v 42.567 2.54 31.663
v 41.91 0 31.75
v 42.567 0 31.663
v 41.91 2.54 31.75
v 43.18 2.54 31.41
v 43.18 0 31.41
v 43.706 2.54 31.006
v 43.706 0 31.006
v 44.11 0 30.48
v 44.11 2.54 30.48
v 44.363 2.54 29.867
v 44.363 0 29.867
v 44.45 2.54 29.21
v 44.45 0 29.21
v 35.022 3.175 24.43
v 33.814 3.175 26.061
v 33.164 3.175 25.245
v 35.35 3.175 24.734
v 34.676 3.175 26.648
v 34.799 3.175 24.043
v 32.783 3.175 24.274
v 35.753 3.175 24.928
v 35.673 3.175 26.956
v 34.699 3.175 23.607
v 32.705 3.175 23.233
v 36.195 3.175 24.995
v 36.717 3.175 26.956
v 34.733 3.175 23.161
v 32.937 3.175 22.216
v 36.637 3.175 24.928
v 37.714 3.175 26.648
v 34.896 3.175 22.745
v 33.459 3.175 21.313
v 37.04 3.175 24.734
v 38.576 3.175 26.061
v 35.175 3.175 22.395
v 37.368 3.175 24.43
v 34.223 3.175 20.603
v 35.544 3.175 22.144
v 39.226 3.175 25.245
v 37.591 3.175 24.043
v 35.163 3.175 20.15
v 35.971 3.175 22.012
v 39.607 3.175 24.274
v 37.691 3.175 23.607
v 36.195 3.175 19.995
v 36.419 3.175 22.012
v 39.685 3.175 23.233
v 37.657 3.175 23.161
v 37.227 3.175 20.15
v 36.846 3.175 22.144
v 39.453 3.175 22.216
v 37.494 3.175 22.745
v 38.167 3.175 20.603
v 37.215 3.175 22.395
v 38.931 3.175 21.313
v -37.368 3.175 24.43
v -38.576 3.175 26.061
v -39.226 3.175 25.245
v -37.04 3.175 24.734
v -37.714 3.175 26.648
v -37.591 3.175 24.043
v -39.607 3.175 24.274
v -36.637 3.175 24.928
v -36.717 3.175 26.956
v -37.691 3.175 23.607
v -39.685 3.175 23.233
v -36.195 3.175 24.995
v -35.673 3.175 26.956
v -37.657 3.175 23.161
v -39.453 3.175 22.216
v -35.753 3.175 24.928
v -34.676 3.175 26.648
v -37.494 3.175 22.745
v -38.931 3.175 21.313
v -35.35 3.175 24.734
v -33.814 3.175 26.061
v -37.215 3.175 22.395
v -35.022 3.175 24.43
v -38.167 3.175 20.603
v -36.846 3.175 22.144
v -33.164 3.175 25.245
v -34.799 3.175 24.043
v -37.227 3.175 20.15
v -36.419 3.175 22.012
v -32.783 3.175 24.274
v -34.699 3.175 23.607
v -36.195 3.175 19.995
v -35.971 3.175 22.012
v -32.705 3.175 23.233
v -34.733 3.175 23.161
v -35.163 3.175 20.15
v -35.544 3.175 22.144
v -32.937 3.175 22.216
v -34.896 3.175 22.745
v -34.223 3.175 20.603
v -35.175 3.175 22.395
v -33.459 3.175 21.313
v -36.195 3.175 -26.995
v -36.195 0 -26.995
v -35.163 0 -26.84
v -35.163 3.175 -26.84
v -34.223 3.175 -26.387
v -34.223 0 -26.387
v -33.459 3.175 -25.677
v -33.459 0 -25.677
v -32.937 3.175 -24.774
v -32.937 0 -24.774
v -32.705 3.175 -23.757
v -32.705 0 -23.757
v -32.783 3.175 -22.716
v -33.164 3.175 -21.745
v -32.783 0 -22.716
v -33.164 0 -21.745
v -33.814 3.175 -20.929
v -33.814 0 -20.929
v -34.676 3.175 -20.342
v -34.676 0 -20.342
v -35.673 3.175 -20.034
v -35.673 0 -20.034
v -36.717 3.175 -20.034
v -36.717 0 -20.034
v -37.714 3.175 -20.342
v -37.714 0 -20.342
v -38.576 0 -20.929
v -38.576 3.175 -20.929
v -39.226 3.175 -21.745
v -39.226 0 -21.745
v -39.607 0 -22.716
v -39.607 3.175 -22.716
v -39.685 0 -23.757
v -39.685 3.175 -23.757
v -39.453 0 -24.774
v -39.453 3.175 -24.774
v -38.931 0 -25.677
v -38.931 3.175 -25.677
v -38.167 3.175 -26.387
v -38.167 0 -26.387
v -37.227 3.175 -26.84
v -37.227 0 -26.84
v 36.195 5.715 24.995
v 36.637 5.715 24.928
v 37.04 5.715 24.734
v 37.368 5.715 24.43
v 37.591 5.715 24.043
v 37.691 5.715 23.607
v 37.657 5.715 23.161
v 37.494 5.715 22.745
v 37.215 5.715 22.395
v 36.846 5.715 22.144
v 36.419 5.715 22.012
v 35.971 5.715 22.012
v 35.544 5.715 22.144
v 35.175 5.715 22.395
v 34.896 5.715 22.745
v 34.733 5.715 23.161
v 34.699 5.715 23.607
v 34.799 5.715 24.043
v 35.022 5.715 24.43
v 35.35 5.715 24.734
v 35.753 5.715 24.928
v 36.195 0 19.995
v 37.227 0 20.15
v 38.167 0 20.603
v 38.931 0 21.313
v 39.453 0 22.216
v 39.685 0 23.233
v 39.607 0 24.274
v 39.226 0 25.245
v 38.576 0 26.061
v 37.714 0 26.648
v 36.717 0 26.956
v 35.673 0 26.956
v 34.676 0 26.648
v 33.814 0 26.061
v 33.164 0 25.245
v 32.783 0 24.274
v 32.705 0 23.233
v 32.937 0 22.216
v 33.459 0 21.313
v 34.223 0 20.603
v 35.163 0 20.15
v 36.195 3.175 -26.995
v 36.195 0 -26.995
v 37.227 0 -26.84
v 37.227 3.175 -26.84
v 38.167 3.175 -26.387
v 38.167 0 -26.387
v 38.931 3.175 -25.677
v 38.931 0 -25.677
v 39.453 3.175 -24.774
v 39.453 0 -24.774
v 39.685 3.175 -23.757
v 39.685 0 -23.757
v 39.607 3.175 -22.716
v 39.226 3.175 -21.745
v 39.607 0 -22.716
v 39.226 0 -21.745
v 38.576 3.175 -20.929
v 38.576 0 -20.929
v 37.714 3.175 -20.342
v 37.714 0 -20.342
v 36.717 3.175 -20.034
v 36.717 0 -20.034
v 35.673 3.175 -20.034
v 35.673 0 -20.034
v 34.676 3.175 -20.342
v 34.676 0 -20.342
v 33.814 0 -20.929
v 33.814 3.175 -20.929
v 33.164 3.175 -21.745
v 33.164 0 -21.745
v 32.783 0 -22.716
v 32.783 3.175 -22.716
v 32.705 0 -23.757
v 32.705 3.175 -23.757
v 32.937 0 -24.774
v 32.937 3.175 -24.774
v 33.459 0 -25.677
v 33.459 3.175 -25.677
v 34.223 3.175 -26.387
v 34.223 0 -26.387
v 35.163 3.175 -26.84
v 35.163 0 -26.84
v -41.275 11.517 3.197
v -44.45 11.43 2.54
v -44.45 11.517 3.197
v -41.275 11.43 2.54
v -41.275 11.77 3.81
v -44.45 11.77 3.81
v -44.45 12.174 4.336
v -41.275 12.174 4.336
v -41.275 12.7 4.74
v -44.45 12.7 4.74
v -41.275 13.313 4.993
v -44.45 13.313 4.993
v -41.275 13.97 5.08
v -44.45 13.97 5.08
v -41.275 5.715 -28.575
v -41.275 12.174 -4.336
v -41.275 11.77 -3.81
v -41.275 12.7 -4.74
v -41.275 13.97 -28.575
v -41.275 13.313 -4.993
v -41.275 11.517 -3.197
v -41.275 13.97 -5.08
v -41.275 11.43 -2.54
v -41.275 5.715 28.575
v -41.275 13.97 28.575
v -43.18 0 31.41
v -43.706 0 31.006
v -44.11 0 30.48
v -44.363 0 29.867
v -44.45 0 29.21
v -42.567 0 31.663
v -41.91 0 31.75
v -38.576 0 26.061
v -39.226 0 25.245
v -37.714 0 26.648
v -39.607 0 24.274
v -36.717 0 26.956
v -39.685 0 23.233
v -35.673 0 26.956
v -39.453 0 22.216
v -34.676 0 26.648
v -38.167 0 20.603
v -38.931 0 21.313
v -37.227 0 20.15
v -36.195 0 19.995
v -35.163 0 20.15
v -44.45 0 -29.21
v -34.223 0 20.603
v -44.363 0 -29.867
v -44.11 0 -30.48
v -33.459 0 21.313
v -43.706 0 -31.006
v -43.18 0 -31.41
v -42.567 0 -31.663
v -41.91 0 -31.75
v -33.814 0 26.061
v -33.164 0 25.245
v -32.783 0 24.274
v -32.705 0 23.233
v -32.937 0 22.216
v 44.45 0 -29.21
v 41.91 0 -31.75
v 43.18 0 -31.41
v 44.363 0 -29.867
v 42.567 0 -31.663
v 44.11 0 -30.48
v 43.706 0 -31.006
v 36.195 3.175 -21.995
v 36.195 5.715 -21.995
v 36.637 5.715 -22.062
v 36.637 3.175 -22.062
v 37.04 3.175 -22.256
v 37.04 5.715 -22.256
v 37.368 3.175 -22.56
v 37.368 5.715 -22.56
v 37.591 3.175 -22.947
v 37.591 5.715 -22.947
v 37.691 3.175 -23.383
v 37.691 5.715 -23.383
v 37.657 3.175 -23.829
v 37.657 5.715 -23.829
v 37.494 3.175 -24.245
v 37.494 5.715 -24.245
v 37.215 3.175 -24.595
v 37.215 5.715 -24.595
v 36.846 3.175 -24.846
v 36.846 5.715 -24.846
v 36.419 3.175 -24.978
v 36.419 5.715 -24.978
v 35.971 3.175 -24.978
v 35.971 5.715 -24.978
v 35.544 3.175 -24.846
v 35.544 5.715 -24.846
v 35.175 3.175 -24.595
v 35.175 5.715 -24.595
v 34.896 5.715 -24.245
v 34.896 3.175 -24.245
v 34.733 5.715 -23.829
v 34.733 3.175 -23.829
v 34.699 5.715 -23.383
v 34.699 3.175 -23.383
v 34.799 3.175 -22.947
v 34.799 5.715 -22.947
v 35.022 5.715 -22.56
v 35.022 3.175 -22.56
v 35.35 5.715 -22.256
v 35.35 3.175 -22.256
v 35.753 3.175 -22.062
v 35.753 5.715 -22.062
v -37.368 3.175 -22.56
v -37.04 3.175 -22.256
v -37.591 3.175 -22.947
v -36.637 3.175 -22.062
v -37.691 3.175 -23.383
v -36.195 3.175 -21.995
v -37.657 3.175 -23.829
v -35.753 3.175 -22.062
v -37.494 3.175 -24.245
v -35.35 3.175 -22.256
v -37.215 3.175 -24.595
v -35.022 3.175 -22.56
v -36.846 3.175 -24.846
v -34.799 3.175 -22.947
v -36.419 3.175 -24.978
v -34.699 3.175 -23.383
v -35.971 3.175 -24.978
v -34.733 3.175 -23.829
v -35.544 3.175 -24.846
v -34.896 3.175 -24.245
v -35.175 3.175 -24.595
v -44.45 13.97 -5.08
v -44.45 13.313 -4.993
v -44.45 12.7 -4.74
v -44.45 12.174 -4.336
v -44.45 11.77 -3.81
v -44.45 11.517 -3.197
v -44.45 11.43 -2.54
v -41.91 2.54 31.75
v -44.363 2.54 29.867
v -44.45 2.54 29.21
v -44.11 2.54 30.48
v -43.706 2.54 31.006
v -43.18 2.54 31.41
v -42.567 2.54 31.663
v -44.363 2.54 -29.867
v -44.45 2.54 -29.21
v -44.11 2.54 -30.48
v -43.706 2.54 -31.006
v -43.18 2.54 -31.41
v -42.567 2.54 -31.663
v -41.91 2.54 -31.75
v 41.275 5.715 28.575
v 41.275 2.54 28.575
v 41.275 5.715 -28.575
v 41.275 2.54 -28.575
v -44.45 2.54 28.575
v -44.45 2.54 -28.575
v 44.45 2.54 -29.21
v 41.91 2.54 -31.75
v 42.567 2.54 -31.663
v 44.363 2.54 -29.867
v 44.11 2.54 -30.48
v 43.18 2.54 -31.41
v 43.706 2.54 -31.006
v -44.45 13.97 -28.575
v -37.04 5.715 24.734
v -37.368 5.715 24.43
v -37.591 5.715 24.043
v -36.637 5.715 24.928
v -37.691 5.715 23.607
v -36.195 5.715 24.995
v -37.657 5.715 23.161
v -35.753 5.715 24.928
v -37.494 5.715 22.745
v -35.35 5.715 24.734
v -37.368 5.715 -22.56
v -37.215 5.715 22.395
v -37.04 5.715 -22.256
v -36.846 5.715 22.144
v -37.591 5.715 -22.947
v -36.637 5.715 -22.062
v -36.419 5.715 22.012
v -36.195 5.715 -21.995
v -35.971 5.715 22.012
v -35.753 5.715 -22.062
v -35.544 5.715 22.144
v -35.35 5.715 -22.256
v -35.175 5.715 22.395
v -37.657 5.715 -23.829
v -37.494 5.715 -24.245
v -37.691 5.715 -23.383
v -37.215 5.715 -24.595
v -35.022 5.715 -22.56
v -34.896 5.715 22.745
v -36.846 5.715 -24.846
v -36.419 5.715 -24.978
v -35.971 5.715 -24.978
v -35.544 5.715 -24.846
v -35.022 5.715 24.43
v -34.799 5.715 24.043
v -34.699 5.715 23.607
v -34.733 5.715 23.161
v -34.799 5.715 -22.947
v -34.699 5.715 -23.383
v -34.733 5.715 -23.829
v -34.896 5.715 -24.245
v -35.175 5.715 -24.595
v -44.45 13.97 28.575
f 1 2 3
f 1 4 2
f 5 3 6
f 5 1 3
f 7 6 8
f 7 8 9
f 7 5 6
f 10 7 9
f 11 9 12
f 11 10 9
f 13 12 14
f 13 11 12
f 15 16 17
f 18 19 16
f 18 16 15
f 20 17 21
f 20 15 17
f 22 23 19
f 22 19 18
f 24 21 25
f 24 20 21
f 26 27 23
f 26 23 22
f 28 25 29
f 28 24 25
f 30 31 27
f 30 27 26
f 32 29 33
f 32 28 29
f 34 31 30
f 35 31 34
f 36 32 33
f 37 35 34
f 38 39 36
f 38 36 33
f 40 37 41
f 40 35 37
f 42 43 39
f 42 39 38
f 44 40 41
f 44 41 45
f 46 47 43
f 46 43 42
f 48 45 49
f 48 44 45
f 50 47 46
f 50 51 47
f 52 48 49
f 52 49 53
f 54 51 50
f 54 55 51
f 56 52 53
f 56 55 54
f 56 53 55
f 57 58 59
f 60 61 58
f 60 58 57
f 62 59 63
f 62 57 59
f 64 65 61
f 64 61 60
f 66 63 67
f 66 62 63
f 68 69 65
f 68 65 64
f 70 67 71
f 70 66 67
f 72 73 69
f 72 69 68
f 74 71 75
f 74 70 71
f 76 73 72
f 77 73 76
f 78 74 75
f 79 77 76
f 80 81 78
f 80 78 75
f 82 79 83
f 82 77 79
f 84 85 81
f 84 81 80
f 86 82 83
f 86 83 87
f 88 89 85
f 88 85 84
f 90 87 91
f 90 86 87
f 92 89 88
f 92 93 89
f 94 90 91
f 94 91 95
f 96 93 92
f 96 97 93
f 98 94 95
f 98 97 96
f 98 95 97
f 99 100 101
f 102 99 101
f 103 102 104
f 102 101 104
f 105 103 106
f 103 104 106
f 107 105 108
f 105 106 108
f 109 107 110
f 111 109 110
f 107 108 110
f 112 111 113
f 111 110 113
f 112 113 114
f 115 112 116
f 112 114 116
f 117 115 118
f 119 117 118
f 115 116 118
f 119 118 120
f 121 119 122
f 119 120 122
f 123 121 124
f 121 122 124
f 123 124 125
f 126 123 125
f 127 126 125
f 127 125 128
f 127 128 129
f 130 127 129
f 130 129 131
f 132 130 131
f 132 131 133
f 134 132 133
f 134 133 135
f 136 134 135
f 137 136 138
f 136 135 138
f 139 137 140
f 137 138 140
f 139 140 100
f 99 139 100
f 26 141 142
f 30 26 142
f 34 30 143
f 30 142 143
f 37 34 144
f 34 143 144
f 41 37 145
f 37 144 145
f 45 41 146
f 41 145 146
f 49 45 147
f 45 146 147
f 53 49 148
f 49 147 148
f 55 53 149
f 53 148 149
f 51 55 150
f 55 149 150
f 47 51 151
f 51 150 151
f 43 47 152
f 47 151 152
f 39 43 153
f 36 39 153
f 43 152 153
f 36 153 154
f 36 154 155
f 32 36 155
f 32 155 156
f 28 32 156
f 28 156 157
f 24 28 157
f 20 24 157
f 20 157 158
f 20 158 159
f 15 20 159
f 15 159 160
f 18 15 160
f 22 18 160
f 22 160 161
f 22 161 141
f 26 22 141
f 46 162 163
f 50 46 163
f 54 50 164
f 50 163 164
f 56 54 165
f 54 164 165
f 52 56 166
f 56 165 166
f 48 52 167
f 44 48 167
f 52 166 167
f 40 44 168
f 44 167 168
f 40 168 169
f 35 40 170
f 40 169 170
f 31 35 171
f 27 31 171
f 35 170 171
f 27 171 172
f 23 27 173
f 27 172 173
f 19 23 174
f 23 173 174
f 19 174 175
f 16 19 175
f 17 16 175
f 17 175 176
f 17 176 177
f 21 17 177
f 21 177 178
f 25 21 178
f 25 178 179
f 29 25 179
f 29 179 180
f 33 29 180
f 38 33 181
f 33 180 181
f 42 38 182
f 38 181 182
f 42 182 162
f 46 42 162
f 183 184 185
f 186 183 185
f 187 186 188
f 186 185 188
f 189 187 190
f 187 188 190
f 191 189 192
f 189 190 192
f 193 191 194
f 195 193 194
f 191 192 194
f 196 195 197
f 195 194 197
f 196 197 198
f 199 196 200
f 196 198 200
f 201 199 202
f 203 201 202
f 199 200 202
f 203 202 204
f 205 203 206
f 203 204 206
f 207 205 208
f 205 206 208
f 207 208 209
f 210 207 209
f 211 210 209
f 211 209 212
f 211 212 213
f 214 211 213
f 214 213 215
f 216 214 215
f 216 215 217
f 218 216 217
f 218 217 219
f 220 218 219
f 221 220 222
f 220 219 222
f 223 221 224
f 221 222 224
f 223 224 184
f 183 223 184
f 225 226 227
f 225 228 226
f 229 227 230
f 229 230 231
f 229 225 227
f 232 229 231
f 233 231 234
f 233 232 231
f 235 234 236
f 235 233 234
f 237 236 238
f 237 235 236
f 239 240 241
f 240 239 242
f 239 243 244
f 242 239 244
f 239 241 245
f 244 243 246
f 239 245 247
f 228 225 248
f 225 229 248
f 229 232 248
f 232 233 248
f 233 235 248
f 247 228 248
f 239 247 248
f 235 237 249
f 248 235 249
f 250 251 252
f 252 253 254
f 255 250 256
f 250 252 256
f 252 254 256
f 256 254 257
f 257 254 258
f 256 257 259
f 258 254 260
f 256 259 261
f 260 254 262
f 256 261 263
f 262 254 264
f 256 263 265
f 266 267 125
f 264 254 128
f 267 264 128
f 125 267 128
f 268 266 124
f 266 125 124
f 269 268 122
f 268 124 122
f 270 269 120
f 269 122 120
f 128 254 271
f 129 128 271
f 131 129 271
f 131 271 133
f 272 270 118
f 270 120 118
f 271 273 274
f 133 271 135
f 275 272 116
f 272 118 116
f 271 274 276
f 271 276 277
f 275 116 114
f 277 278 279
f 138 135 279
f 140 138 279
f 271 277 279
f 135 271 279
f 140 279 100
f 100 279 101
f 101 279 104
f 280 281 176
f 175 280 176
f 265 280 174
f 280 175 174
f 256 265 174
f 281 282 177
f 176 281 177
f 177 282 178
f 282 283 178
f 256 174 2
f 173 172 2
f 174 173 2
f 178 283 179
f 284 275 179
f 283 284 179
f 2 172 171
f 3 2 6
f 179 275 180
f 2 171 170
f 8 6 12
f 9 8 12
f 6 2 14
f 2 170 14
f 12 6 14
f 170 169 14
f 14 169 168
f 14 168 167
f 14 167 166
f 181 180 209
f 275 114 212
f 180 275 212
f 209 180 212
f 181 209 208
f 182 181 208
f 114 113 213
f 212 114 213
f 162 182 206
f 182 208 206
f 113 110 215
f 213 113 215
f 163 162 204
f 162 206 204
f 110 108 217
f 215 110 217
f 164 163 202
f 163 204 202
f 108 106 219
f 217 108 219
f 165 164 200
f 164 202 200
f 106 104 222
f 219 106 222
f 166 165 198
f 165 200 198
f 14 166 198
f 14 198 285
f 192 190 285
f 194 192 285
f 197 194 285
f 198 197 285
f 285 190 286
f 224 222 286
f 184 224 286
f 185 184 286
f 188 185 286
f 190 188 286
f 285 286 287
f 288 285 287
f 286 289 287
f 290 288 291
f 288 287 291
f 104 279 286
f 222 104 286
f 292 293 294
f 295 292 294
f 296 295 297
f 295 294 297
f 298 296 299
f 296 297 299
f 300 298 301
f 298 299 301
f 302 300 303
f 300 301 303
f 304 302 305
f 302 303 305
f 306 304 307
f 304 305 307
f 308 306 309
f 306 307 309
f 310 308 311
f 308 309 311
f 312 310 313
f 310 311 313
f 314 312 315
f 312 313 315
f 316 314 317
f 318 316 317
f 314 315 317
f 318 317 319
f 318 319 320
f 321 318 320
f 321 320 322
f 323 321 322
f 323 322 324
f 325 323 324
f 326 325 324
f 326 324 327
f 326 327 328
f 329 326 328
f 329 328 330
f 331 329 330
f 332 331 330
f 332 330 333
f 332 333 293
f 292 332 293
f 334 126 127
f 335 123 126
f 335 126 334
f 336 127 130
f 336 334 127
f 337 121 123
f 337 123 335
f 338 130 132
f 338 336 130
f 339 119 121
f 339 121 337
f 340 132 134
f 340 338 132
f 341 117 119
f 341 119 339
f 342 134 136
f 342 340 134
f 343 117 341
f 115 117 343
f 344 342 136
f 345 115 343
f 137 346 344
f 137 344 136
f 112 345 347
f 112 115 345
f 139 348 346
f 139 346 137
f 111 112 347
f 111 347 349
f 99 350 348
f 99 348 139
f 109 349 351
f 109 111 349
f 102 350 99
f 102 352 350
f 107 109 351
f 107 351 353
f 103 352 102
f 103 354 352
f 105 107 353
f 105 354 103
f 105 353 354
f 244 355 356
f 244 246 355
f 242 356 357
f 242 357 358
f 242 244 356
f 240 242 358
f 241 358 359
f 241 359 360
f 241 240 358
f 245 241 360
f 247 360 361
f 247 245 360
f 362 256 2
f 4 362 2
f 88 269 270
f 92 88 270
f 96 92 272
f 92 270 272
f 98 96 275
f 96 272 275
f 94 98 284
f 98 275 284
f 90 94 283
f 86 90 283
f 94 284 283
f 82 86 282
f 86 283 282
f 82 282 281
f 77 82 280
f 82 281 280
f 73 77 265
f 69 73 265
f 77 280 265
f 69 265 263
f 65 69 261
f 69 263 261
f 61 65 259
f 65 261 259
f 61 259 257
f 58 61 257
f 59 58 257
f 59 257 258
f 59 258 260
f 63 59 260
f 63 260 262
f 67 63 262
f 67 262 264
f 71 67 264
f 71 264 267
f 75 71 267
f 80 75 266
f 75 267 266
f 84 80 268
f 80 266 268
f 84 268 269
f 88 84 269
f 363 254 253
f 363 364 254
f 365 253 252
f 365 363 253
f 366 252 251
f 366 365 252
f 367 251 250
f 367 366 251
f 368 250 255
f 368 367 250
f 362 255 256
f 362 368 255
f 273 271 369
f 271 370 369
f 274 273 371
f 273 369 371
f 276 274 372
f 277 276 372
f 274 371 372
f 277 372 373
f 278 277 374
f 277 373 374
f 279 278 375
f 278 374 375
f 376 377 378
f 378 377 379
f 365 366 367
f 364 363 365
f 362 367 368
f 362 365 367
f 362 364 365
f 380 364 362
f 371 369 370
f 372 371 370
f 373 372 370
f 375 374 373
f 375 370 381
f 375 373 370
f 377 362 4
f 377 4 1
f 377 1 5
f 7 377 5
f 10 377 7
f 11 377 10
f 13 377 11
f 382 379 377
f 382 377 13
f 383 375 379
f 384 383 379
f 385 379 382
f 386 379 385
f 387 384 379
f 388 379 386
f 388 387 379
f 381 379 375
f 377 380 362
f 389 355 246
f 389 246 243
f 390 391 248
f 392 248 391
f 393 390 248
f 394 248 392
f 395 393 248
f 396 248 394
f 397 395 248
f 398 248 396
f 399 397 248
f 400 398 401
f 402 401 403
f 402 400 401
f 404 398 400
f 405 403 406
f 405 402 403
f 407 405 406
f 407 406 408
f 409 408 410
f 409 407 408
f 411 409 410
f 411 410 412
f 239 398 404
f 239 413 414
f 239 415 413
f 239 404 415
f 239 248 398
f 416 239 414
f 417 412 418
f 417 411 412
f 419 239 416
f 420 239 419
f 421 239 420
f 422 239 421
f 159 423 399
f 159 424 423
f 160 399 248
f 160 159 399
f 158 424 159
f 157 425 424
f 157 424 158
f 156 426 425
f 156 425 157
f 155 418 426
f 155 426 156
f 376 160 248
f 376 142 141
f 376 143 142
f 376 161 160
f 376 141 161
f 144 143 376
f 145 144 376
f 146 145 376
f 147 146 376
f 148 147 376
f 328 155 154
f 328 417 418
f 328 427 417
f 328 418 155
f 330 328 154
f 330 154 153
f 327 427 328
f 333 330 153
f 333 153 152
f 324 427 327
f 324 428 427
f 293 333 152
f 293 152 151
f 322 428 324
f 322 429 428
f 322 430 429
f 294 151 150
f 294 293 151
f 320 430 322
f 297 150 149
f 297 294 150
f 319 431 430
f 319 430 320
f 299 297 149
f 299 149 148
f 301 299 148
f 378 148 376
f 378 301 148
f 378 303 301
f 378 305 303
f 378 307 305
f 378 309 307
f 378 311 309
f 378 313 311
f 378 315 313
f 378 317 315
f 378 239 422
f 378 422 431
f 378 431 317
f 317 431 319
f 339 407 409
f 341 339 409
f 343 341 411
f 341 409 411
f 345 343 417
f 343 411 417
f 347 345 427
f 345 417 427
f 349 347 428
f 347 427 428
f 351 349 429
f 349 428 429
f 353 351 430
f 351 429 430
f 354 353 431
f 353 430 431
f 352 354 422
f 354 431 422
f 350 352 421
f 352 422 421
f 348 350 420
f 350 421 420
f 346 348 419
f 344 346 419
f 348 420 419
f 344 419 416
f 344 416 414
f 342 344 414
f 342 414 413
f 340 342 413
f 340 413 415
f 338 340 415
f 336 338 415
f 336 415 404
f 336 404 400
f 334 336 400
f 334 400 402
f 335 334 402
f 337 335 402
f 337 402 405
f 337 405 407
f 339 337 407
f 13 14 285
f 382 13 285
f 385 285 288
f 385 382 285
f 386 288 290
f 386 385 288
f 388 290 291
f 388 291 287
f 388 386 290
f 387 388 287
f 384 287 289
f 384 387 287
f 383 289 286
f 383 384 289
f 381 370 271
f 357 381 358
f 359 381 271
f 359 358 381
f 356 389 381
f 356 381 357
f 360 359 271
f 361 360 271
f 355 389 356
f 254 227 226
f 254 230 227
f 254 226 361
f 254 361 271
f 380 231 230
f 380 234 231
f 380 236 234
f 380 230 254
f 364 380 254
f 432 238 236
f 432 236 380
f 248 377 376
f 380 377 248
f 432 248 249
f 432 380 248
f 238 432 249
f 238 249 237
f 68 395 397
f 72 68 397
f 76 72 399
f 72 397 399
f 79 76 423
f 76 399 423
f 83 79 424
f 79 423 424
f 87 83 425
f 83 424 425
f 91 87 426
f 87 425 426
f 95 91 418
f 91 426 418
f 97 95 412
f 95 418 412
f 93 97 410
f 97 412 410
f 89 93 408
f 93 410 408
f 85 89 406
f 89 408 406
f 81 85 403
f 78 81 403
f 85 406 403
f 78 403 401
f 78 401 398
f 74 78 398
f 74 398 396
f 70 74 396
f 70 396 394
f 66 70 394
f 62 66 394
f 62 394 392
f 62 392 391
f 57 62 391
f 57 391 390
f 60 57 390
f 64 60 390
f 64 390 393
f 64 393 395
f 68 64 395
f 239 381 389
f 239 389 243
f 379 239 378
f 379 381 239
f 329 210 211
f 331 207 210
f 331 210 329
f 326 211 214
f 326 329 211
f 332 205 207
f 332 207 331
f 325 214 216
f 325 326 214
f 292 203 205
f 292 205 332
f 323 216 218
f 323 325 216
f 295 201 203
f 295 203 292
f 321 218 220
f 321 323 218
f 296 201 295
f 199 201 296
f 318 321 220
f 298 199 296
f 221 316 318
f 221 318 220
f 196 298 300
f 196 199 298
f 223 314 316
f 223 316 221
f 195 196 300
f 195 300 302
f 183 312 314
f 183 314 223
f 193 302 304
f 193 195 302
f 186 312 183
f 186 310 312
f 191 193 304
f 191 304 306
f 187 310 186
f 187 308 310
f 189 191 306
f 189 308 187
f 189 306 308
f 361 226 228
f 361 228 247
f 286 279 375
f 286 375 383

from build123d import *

# Parameters (mm, degrees)
SKETCH1_W           = 82.55
SKETCH1_H           = 57.15
BOSS_EXTRUDE2_DEPTH = 5.715
SKETCH1_7_W         = 88.9
SKETCH1_7_H         = 63.5
SKETCH1_7_W_2       = 82.55
SKETCH1_7_H_2       = 57.15
TOP_DEPTH           = 2.54
FRONTLIP_DEPTH      = 3.175
SKETCH4_R           = 1.5
M3SCREWHOLE_DEPTH   = 13.208
FILLET1_R           = 2.54
SKETCH5_R           = 3.5
SCREWHEADHOLE_DEPTH = 3.175


with BuildPart() as part:
    # Sketch1 → Boss-Extrude2 (new body)
    with BuildSketch(Plane(origin=(0, 0, 0), x_dir=(1, 0, 0), z_dir=(0, 1, 0))):
        Rectangle(SKETCH1_W, SKETCH1_H)
    extrude(amount=BOSS_EXTRUDE2_DEPTH)

    # Sketch1<7> → Top (add)
    with BuildSketch(Plane(origin=(0, 0, 0), x_dir=(1, 0, 0), z_dir=(0, 1, 0))):
        Rectangle(SKETCH1_7_W, SKETCH1_7_H)
        Rectangle(SKETCH1_7_W_2, SKETCH1_7_H_2, mode=Mode.SUBTRACT)
    extrude(amount=TOP_DEPTH)

    # Sketch3 → FrontLip (add)
    with BuildSketch(Plane.ZY.offset(44.45)):
        Polygon((-28.575, 2.54), (28.575, 2.54), (28.575, 13.97), (5.08, 13.97), (5.08, 11.43), (-5.08, 11.43), (-5.08, 13.97), (-28.575, 13.97), align=None)
    extrude(amount=-FRONTLIP_DEPTH)

    # Sketch4 → M3ScrewHole (cut)
    with BuildSketch(Plane(origin=(0, 5.715, 0), x_dir=(1, 0, 0), z_dir=(0, 1, 0))):
        with Locations(Location((-36.195, 23.495, 0), (0, 0, 270))):
            Circle(SKETCH4_R)
        with Locations(Location((36.195, 23.495, 0), (0, 0, 270))):
            Circle(SKETCH4_R)
        with Locations(Location((36.195, -23.495, 0), (0, 0, 270))):
            Circle(SKETCH4_R)
        with Locations(Location((-36.195, -23.495, 0), (0, 0, 270))):
            Circle(SKETCH4_R)
    extrude(amount=-M3SCREWHOLE_DEPTH, mode=Mode.SUBTRACT)

    # Fillet1
    fillet1_edges = [part.edges().sort_by_distance(p)[0] for p in [
        (-42.8625, 11.43, -5.08),
        (-42.8625, 11.43, 5.08),
        (44.45, 1.27, 31.75),
        (44.45, 1.27, -31.75),
        (-44.45, 1.27, 31.75),
        (-44.45, 1.27, -31.75),
    ]]
    fillet(fillet1_edges, radius=FILLET1_R - 0.0001)  # a hair under: the kernel refuses the full size

    # Sketch5 → ScrewHeadHole (cut)
    with BuildSketch(Plane.XZ):
        with Locations(Location((-36.195, 23.495, 0), (0, 0, 270))):
            Circle(SKETCH5_R)
        with Locations(Location((-36.195, -23.495, 0), (0, 0, 270))):
            Circle(SKETCH5_R)
        with Locations(Location((36.195, -23.495, 0), (0, 0, 270))):
            Circle(SKETCH5_R)
        with Locations(Location((36.195, 23.495, 0), (0, 0, 270))):
            Circle(SKETCH5_R)
    extrude(amount=-SCREWHEADHOLE_DEPTH, mode=Mode.SUBTRACT)


solid = part.part
